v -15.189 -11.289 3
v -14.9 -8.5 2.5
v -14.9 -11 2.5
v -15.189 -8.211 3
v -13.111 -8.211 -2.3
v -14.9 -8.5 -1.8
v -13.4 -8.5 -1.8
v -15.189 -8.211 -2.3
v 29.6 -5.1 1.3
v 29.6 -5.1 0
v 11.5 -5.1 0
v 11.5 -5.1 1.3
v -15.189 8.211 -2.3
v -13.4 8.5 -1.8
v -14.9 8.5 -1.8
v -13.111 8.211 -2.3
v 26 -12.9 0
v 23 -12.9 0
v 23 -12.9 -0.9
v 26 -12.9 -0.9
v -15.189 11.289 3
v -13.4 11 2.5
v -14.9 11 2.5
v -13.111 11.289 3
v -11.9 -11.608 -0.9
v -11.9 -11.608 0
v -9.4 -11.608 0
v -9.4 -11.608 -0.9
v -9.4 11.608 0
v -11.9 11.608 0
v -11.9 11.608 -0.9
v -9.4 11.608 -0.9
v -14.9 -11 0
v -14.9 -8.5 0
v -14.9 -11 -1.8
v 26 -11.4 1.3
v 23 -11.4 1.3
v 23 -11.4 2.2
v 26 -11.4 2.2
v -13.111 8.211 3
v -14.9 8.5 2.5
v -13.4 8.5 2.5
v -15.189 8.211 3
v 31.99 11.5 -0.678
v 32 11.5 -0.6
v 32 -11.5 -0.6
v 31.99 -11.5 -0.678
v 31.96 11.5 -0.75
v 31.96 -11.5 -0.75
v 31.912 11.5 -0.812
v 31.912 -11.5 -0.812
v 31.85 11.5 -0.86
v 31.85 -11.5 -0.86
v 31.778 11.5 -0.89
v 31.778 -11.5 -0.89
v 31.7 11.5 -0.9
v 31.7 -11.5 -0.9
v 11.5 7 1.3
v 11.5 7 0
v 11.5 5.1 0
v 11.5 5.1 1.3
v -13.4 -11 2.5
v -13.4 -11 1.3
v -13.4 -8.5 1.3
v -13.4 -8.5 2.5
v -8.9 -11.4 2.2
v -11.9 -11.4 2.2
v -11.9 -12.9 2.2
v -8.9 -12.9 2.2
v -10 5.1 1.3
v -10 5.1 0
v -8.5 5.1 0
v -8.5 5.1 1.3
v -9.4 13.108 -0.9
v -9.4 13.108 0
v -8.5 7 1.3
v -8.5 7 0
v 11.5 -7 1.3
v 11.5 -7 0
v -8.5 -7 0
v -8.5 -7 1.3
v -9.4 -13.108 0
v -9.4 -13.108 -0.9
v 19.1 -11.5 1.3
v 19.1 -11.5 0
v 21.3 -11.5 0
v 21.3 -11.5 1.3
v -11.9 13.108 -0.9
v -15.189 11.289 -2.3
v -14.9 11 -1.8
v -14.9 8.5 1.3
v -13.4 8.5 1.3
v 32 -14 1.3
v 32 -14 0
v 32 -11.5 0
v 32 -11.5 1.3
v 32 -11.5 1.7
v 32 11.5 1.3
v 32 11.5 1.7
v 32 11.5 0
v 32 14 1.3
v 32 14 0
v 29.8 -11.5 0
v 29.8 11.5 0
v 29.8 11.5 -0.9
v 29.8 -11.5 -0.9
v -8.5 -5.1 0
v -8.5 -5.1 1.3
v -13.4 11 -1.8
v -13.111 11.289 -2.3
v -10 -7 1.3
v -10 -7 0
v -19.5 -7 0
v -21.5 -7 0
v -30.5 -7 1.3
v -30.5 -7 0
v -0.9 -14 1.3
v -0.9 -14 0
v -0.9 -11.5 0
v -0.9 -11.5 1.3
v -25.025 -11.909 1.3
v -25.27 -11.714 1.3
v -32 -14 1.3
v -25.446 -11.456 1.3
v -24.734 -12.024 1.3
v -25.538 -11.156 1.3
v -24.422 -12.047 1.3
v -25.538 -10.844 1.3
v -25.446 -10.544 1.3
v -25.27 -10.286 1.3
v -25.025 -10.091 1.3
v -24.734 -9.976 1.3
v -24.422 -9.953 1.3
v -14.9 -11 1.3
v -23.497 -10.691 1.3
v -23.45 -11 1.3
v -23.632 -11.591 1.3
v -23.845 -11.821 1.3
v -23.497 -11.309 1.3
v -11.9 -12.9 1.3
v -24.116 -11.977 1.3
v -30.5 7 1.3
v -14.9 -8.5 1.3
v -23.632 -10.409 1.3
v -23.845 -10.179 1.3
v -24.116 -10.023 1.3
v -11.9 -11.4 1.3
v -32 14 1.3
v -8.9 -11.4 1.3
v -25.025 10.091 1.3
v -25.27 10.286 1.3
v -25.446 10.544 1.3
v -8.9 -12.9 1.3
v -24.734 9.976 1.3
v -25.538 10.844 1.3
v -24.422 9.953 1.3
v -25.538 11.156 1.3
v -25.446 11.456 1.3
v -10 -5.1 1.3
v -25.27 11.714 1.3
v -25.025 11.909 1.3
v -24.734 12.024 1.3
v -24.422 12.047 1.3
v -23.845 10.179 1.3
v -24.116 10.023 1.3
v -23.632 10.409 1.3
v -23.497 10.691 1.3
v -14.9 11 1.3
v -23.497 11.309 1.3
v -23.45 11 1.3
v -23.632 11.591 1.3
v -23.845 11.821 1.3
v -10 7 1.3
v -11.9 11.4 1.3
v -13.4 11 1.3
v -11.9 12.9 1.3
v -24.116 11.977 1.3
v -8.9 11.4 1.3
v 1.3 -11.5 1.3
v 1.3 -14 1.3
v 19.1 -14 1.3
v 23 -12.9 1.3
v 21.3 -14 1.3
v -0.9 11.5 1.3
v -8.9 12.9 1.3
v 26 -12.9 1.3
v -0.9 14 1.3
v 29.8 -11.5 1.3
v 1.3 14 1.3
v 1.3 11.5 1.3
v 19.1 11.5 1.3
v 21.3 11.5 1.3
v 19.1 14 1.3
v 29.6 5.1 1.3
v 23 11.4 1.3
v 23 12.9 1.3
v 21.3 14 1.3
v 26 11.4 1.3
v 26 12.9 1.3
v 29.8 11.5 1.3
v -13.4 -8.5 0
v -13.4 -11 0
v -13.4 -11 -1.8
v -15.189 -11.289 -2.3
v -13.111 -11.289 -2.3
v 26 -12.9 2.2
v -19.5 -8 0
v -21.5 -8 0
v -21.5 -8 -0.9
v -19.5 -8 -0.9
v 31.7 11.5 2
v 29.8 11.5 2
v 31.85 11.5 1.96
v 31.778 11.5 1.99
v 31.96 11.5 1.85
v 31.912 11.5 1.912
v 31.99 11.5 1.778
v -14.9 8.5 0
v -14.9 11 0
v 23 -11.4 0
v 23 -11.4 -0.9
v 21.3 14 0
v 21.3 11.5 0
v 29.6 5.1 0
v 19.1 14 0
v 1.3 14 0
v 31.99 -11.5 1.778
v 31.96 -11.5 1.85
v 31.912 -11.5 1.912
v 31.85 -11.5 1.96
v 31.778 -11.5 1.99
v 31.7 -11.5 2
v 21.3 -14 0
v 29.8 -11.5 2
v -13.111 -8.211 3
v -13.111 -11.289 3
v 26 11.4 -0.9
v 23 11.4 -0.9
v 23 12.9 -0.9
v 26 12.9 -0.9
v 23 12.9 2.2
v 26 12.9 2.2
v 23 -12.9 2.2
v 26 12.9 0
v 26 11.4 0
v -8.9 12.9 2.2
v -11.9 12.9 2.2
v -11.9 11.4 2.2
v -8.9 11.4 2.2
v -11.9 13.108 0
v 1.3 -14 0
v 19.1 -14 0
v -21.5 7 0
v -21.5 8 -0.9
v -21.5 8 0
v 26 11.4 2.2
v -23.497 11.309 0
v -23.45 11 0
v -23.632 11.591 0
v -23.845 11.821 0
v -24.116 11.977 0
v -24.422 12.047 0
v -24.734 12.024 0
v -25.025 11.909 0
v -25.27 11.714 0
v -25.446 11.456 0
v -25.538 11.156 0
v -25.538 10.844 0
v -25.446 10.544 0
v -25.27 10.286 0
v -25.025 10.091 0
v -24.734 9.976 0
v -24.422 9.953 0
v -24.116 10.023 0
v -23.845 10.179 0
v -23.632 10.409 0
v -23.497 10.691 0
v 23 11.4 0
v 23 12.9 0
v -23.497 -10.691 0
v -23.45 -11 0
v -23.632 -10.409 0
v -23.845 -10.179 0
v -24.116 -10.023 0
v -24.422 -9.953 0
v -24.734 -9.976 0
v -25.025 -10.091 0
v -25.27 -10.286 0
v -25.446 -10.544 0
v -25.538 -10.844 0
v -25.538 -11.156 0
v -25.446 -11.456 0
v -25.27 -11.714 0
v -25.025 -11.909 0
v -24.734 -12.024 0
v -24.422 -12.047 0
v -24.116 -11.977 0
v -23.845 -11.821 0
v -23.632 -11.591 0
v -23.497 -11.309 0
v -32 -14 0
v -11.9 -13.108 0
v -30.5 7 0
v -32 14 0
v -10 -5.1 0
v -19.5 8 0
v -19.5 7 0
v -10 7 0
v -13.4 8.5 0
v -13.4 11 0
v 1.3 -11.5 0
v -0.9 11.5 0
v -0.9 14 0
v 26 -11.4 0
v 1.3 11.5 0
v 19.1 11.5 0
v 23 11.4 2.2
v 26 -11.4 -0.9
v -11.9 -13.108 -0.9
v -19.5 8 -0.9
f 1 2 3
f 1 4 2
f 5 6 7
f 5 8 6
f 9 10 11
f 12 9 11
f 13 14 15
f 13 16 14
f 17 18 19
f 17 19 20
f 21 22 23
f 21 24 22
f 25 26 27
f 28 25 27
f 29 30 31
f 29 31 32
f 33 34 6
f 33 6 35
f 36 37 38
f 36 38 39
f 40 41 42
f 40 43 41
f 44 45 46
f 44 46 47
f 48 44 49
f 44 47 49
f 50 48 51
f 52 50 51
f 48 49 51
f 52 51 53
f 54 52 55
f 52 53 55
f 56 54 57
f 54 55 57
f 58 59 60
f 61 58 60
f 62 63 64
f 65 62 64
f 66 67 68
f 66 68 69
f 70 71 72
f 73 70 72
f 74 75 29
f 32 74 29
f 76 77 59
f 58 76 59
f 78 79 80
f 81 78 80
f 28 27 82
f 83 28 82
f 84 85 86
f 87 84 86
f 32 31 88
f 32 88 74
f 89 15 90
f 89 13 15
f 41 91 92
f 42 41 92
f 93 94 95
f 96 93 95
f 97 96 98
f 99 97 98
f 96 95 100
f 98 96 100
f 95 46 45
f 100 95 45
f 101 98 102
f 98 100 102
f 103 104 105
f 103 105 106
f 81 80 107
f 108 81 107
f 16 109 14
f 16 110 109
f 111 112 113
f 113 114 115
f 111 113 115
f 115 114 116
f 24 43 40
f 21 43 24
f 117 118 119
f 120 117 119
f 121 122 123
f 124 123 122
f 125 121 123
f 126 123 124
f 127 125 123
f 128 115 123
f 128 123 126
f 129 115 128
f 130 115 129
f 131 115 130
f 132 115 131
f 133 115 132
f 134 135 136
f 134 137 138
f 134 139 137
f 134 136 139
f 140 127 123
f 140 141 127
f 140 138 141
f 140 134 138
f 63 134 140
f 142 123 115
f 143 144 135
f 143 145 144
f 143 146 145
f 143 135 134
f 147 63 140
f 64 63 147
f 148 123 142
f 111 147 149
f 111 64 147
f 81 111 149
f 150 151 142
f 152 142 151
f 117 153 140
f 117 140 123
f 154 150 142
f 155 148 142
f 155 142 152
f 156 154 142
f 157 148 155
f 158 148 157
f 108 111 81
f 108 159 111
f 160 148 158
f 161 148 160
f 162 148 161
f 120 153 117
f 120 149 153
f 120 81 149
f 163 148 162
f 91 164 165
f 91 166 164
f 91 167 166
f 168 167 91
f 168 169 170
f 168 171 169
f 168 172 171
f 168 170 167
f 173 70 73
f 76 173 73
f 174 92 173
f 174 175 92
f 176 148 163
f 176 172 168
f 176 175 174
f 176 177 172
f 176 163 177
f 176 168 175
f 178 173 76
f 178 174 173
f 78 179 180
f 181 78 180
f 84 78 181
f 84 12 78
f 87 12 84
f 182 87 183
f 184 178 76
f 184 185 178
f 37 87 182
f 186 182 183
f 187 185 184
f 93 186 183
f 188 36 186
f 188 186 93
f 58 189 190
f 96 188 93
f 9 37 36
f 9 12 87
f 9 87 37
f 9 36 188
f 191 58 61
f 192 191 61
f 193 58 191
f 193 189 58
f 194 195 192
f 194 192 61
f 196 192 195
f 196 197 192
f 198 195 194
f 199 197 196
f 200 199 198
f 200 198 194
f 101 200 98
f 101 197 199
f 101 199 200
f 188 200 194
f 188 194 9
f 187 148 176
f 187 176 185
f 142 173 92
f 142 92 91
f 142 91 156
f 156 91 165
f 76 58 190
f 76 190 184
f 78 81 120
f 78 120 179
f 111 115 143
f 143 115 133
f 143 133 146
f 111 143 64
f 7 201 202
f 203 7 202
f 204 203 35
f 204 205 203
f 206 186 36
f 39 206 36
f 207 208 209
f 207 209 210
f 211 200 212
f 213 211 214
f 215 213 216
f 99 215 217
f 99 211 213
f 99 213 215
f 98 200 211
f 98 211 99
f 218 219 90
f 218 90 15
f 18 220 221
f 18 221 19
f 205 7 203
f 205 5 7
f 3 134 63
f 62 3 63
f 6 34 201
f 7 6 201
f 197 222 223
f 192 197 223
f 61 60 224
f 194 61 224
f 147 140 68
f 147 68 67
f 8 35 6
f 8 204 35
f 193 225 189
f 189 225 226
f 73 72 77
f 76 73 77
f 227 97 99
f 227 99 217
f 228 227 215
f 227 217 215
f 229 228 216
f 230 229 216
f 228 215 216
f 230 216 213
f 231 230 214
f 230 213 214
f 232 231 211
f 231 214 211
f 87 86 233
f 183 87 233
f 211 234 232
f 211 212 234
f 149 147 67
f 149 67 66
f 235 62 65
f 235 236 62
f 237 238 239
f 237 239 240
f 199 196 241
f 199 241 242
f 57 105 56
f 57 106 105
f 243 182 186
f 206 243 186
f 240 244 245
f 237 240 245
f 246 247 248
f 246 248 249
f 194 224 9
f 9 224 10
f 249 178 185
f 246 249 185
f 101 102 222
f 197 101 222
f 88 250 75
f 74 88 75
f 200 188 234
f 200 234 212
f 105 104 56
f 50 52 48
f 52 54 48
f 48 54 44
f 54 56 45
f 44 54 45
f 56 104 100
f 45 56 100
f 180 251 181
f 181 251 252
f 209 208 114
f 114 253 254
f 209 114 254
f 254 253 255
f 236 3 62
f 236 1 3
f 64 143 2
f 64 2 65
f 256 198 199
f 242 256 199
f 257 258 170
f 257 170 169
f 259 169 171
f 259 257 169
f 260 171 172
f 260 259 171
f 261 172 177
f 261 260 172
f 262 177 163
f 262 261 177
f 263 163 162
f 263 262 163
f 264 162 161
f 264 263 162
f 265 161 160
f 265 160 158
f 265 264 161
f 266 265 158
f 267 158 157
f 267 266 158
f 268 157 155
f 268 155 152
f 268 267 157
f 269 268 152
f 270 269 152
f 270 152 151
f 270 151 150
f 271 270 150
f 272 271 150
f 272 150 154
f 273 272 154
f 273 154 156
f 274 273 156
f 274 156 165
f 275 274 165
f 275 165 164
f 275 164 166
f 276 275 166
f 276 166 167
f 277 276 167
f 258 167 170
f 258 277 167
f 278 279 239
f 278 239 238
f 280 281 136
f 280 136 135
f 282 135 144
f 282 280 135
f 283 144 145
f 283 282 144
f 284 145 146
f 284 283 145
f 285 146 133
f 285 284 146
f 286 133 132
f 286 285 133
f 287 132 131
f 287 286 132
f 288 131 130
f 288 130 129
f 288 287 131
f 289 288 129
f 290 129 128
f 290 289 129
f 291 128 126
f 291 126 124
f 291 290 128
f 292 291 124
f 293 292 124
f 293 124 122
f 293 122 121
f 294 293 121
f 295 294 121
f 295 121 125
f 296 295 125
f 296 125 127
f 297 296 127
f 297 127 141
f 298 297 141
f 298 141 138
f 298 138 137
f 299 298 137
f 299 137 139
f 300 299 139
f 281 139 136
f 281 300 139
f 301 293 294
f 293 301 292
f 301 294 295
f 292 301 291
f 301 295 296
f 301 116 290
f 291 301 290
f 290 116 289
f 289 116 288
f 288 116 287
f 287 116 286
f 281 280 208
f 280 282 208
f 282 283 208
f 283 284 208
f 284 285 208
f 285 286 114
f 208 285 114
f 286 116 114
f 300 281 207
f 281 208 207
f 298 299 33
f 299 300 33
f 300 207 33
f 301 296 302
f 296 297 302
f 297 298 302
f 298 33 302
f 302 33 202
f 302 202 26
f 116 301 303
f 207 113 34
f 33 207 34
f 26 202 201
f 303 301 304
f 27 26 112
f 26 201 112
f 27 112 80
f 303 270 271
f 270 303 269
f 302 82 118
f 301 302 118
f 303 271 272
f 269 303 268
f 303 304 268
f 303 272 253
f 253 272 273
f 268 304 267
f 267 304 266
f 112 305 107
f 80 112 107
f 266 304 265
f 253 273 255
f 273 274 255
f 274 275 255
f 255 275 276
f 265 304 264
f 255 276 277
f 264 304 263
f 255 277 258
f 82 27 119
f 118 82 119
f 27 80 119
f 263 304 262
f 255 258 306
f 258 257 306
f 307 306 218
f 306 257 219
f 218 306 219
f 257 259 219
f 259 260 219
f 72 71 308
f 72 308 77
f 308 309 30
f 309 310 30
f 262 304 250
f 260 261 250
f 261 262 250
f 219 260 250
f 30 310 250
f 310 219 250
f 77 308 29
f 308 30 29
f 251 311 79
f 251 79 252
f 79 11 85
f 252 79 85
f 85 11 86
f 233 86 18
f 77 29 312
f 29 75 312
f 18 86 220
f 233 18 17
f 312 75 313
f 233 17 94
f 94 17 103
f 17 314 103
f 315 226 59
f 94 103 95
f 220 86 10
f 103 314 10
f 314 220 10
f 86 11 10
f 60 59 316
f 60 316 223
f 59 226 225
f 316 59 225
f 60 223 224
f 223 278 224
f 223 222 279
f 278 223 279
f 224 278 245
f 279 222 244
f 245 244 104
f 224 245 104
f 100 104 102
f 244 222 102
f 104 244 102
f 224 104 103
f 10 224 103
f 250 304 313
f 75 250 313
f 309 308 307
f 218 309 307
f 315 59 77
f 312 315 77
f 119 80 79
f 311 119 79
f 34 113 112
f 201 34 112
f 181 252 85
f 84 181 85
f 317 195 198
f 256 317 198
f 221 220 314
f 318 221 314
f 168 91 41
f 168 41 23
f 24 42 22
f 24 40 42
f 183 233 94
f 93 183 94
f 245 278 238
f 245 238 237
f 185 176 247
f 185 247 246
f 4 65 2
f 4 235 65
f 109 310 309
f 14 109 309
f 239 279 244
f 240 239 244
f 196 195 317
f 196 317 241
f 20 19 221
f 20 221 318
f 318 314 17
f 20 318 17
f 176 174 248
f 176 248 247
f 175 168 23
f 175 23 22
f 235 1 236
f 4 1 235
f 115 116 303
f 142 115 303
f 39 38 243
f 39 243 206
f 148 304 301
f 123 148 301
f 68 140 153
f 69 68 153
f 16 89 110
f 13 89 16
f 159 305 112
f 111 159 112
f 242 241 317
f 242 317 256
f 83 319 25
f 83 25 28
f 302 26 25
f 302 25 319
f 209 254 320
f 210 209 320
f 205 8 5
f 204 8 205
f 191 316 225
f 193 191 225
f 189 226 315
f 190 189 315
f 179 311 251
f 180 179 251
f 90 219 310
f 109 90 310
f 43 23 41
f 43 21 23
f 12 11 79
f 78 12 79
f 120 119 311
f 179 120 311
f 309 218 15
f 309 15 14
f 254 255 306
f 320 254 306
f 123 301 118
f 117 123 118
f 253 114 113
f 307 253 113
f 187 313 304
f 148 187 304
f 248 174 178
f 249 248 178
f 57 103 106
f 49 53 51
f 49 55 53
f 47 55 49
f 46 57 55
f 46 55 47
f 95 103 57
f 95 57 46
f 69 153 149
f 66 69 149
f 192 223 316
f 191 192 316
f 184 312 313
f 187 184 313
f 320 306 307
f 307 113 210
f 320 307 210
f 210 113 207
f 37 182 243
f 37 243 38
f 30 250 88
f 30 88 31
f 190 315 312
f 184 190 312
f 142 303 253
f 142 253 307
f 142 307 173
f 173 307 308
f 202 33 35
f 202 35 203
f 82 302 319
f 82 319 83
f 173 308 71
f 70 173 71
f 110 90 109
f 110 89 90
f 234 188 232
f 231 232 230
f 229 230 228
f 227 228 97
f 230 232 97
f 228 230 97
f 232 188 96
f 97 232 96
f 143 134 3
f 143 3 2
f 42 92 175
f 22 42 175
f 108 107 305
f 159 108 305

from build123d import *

# Parameters (mm, degrees)
F0_R      = 1.05
F1_DEPTH  = 1.3
F3_W      = 2.2
F3_H      = 23
F4_DEPTH  = 0.7
F5_W      = 2.5
F5_H      = 1.5
F5_W_2    = 3
F5_W_3    = 2.2
F5_H_2    = 23
F6_DEPTH  = 0.9
F7_R      = 0.3
F8_R      = 0.3
F9_W      = 2
F9_H      = 1
F9_H_2    = 14
F10_DEPTH = 0.9
F3_W_2    = 3
F3_H_2    = 1.5
F11_DEPTH = 0.9
F5_W_4    = 1.5
F5_H_3    = 2.5
F12_DEPTH = 1.8
F13_W     = 1.5
F13_H     = 2.5
F14_DEPTH = 0.5
F14_TAPER = -30
F3_W_3    = 1.5
F3_H_3    = 2.5
F15_DEPTH = 1.2
F16_W     = 1.5
F16_H     = 2.5
F17_DEPTH = 0.5
F17_TAPER = -30


with BuildPart() as f1:
    # F0 (on Top) → F1 (new body)
    with BuildSketch(Plane.XY):
        Polygon((21.3, -14), (32, -14), (32, 14), (21.3, 14), (21.3, 11.5), (19.1, 11.5), (19.1, 14), (1.3, 14), (1.3, 11.5), (-0.9, 11.5), (-0.9, 14), (-32, 14), (-32, -14), (-0.9, -14), (-0.9, -11.5), (1.3, -11.5), (1.3, -14), (19.1, -14), (19.1, -11.5), (21.3, -11.5), align=None)
        with Locations((-24.5, -11)):
            Circle(F0_R, mode=Mode.SUBTRACT)
        Polygon((-10, 7), (-10, 5.1), (-8.5, 5.1), (-8.5, 7), (11.5, 7), (11.5, 5.1), (29.6, 5.1), (29.6, -5.1), (11.5, -5.1), (11.5, -7), (-8.5, -7), (-8.5, -5.1), (-10, -5.1), (-10, -7), (-30.5, -7), (-30.5, -5.1), (-30.5, 5.1), (-30.5, 7), align=None, mode=Mode.SUBTRACT)
        with Locations((-24.5, 11)):
            Circle(F0_R, mode=Mode.SUBTRACT)
    extrude(amount=F1_DEPTH)

    # F3 (on face) → F4 (join)
    with BuildSketch(Plane.XY.offset(1.3)):
        with Locations((30.9, 0)):
            Rectangle(F3_W, F3_H)
    extrude(amount=F4_DEPTH)

    # F5 (on face) → F6 (join)
    with BuildSketch(Plane(origin=(0, 0, 0), x_dir=(1, 0, 0), z_dir=(0, 0, -1))):
        with Locations((-10.65, 12.3576217964)):
            Rectangle(F5_W, F5_H)
        with Locations((-10.65, -12.3576217964)):
            Rectangle(F5_W, F5_H)
        with Locations((24.5, -12.15)):
            Rectangle(F5_W_2, F5_H)
        with Locations((30.9, 0)):
            Rectangle(F5_W_3, F5_H_2)
        with Locations((24.5, 12.15)):
            Rectangle(F5_W_2, F5_H)
    extrude(amount=F6_DEPTH)

    # F7
    f7_edges = [f1.edges().sort_by_distance(p)[0] for p in [
        (32, 0, -0.9),
    ]]
    fillet(f7_edges, radius=F7_R)

    # F8
    f8_edges = [f1.edges().sort_by_distance(p)[0] for p in [
        (32, 0, 2),
    ]]
    fillet(f8_edges, radius=F8_R)

    # F9 (on face) → F10 (join)
    with BuildSketch(Plane(origin=(0, 0, 0), x_dir=(1, 0, 0), z_dir=(0, 0, -1))):
        with Locations((-20.5, 7.5)):
            Rectangle(F9_W, F9_H)
        with Locations((-20.5, -7.5)):
            Rectangle(F9_W, F9_H)
        with Locations((-20.5, 0)):
            Rectangle(F9_W, F9_H_2)
    extrude(amount=F10_DEPTH)

    # F3 (on face) → F11 (join)
    with BuildSketch(Plane.XY.offset(1.3)):
        with Locations((-10.4, 12.15)):
            Rectangle(F3_W_2, F3_H_2)
        with Locations((-10.4, -12.15)):
            Rectangle(F3_W_2, F3_H_2)
        with Locations((24.5, -12.15)):
            Rectangle(F3_W_2, F3_H_2)
        with Locations((24.5, 12.15)):
            Rectangle(F3_W_2, F3_H_2)
    extrude(amount=F11_DEPTH)

    # F5 (on face) → F12 (join)
    with BuildSketch(Plane(origin=(0, 0, 0), x_dir=(1, 0, 0), z_dir=(0, 0, -1))):
        with Locations((-14.15, 9.75)):
            Rectangle(F5_W_4, F5_H_3)
        with Locations((-14.15, -9.75)):
            Rectangle(F5_W_4, F5_H_3)
    extrude(amount=F12_DEPTH)

    # F13 (on face) → F14 (join)
    with BuildSketch(Plane(origin=(0, 0, -1.8), x_dir=(1, 0, 0), z_dir=(0, 0, -1))):
        with Locations((-14.15, 9.75)):
            Rectangle(F13_W, F13_H)
        with Locations((-14.15, -9.75)):
            Rectangle(F13_W, F13_H)
    extrude(amount=F14_DEPTH, taper=F14_TAPER)

    # F3 (on face) → F15 (join)
    with BuildSketch(Plane.XY.offset(1.3)):
        with Locations((-14.15, 9.75)):
            Rectangle(F3_W_3, F3_H_3)
        with Locations((-14.15, -9.75)):
            Rectangle(F3_W_3, F3_H_3)
    extrude(amount=F15_DEPTH)

    # F16 (on face) → F17 (join)
    with BuildSketch(Plane.XY.offset(2.5)):
        with Locations((-14.15, 9.75)):
            Rectangle(F16_W, F16_H)
        with Locations((-14.15, -9.75)):
            Rectangle(F16_W, F16_H)
    extrude(amount=F17_DEPTH, taper=F17_TAPER)


solid = f1.part
